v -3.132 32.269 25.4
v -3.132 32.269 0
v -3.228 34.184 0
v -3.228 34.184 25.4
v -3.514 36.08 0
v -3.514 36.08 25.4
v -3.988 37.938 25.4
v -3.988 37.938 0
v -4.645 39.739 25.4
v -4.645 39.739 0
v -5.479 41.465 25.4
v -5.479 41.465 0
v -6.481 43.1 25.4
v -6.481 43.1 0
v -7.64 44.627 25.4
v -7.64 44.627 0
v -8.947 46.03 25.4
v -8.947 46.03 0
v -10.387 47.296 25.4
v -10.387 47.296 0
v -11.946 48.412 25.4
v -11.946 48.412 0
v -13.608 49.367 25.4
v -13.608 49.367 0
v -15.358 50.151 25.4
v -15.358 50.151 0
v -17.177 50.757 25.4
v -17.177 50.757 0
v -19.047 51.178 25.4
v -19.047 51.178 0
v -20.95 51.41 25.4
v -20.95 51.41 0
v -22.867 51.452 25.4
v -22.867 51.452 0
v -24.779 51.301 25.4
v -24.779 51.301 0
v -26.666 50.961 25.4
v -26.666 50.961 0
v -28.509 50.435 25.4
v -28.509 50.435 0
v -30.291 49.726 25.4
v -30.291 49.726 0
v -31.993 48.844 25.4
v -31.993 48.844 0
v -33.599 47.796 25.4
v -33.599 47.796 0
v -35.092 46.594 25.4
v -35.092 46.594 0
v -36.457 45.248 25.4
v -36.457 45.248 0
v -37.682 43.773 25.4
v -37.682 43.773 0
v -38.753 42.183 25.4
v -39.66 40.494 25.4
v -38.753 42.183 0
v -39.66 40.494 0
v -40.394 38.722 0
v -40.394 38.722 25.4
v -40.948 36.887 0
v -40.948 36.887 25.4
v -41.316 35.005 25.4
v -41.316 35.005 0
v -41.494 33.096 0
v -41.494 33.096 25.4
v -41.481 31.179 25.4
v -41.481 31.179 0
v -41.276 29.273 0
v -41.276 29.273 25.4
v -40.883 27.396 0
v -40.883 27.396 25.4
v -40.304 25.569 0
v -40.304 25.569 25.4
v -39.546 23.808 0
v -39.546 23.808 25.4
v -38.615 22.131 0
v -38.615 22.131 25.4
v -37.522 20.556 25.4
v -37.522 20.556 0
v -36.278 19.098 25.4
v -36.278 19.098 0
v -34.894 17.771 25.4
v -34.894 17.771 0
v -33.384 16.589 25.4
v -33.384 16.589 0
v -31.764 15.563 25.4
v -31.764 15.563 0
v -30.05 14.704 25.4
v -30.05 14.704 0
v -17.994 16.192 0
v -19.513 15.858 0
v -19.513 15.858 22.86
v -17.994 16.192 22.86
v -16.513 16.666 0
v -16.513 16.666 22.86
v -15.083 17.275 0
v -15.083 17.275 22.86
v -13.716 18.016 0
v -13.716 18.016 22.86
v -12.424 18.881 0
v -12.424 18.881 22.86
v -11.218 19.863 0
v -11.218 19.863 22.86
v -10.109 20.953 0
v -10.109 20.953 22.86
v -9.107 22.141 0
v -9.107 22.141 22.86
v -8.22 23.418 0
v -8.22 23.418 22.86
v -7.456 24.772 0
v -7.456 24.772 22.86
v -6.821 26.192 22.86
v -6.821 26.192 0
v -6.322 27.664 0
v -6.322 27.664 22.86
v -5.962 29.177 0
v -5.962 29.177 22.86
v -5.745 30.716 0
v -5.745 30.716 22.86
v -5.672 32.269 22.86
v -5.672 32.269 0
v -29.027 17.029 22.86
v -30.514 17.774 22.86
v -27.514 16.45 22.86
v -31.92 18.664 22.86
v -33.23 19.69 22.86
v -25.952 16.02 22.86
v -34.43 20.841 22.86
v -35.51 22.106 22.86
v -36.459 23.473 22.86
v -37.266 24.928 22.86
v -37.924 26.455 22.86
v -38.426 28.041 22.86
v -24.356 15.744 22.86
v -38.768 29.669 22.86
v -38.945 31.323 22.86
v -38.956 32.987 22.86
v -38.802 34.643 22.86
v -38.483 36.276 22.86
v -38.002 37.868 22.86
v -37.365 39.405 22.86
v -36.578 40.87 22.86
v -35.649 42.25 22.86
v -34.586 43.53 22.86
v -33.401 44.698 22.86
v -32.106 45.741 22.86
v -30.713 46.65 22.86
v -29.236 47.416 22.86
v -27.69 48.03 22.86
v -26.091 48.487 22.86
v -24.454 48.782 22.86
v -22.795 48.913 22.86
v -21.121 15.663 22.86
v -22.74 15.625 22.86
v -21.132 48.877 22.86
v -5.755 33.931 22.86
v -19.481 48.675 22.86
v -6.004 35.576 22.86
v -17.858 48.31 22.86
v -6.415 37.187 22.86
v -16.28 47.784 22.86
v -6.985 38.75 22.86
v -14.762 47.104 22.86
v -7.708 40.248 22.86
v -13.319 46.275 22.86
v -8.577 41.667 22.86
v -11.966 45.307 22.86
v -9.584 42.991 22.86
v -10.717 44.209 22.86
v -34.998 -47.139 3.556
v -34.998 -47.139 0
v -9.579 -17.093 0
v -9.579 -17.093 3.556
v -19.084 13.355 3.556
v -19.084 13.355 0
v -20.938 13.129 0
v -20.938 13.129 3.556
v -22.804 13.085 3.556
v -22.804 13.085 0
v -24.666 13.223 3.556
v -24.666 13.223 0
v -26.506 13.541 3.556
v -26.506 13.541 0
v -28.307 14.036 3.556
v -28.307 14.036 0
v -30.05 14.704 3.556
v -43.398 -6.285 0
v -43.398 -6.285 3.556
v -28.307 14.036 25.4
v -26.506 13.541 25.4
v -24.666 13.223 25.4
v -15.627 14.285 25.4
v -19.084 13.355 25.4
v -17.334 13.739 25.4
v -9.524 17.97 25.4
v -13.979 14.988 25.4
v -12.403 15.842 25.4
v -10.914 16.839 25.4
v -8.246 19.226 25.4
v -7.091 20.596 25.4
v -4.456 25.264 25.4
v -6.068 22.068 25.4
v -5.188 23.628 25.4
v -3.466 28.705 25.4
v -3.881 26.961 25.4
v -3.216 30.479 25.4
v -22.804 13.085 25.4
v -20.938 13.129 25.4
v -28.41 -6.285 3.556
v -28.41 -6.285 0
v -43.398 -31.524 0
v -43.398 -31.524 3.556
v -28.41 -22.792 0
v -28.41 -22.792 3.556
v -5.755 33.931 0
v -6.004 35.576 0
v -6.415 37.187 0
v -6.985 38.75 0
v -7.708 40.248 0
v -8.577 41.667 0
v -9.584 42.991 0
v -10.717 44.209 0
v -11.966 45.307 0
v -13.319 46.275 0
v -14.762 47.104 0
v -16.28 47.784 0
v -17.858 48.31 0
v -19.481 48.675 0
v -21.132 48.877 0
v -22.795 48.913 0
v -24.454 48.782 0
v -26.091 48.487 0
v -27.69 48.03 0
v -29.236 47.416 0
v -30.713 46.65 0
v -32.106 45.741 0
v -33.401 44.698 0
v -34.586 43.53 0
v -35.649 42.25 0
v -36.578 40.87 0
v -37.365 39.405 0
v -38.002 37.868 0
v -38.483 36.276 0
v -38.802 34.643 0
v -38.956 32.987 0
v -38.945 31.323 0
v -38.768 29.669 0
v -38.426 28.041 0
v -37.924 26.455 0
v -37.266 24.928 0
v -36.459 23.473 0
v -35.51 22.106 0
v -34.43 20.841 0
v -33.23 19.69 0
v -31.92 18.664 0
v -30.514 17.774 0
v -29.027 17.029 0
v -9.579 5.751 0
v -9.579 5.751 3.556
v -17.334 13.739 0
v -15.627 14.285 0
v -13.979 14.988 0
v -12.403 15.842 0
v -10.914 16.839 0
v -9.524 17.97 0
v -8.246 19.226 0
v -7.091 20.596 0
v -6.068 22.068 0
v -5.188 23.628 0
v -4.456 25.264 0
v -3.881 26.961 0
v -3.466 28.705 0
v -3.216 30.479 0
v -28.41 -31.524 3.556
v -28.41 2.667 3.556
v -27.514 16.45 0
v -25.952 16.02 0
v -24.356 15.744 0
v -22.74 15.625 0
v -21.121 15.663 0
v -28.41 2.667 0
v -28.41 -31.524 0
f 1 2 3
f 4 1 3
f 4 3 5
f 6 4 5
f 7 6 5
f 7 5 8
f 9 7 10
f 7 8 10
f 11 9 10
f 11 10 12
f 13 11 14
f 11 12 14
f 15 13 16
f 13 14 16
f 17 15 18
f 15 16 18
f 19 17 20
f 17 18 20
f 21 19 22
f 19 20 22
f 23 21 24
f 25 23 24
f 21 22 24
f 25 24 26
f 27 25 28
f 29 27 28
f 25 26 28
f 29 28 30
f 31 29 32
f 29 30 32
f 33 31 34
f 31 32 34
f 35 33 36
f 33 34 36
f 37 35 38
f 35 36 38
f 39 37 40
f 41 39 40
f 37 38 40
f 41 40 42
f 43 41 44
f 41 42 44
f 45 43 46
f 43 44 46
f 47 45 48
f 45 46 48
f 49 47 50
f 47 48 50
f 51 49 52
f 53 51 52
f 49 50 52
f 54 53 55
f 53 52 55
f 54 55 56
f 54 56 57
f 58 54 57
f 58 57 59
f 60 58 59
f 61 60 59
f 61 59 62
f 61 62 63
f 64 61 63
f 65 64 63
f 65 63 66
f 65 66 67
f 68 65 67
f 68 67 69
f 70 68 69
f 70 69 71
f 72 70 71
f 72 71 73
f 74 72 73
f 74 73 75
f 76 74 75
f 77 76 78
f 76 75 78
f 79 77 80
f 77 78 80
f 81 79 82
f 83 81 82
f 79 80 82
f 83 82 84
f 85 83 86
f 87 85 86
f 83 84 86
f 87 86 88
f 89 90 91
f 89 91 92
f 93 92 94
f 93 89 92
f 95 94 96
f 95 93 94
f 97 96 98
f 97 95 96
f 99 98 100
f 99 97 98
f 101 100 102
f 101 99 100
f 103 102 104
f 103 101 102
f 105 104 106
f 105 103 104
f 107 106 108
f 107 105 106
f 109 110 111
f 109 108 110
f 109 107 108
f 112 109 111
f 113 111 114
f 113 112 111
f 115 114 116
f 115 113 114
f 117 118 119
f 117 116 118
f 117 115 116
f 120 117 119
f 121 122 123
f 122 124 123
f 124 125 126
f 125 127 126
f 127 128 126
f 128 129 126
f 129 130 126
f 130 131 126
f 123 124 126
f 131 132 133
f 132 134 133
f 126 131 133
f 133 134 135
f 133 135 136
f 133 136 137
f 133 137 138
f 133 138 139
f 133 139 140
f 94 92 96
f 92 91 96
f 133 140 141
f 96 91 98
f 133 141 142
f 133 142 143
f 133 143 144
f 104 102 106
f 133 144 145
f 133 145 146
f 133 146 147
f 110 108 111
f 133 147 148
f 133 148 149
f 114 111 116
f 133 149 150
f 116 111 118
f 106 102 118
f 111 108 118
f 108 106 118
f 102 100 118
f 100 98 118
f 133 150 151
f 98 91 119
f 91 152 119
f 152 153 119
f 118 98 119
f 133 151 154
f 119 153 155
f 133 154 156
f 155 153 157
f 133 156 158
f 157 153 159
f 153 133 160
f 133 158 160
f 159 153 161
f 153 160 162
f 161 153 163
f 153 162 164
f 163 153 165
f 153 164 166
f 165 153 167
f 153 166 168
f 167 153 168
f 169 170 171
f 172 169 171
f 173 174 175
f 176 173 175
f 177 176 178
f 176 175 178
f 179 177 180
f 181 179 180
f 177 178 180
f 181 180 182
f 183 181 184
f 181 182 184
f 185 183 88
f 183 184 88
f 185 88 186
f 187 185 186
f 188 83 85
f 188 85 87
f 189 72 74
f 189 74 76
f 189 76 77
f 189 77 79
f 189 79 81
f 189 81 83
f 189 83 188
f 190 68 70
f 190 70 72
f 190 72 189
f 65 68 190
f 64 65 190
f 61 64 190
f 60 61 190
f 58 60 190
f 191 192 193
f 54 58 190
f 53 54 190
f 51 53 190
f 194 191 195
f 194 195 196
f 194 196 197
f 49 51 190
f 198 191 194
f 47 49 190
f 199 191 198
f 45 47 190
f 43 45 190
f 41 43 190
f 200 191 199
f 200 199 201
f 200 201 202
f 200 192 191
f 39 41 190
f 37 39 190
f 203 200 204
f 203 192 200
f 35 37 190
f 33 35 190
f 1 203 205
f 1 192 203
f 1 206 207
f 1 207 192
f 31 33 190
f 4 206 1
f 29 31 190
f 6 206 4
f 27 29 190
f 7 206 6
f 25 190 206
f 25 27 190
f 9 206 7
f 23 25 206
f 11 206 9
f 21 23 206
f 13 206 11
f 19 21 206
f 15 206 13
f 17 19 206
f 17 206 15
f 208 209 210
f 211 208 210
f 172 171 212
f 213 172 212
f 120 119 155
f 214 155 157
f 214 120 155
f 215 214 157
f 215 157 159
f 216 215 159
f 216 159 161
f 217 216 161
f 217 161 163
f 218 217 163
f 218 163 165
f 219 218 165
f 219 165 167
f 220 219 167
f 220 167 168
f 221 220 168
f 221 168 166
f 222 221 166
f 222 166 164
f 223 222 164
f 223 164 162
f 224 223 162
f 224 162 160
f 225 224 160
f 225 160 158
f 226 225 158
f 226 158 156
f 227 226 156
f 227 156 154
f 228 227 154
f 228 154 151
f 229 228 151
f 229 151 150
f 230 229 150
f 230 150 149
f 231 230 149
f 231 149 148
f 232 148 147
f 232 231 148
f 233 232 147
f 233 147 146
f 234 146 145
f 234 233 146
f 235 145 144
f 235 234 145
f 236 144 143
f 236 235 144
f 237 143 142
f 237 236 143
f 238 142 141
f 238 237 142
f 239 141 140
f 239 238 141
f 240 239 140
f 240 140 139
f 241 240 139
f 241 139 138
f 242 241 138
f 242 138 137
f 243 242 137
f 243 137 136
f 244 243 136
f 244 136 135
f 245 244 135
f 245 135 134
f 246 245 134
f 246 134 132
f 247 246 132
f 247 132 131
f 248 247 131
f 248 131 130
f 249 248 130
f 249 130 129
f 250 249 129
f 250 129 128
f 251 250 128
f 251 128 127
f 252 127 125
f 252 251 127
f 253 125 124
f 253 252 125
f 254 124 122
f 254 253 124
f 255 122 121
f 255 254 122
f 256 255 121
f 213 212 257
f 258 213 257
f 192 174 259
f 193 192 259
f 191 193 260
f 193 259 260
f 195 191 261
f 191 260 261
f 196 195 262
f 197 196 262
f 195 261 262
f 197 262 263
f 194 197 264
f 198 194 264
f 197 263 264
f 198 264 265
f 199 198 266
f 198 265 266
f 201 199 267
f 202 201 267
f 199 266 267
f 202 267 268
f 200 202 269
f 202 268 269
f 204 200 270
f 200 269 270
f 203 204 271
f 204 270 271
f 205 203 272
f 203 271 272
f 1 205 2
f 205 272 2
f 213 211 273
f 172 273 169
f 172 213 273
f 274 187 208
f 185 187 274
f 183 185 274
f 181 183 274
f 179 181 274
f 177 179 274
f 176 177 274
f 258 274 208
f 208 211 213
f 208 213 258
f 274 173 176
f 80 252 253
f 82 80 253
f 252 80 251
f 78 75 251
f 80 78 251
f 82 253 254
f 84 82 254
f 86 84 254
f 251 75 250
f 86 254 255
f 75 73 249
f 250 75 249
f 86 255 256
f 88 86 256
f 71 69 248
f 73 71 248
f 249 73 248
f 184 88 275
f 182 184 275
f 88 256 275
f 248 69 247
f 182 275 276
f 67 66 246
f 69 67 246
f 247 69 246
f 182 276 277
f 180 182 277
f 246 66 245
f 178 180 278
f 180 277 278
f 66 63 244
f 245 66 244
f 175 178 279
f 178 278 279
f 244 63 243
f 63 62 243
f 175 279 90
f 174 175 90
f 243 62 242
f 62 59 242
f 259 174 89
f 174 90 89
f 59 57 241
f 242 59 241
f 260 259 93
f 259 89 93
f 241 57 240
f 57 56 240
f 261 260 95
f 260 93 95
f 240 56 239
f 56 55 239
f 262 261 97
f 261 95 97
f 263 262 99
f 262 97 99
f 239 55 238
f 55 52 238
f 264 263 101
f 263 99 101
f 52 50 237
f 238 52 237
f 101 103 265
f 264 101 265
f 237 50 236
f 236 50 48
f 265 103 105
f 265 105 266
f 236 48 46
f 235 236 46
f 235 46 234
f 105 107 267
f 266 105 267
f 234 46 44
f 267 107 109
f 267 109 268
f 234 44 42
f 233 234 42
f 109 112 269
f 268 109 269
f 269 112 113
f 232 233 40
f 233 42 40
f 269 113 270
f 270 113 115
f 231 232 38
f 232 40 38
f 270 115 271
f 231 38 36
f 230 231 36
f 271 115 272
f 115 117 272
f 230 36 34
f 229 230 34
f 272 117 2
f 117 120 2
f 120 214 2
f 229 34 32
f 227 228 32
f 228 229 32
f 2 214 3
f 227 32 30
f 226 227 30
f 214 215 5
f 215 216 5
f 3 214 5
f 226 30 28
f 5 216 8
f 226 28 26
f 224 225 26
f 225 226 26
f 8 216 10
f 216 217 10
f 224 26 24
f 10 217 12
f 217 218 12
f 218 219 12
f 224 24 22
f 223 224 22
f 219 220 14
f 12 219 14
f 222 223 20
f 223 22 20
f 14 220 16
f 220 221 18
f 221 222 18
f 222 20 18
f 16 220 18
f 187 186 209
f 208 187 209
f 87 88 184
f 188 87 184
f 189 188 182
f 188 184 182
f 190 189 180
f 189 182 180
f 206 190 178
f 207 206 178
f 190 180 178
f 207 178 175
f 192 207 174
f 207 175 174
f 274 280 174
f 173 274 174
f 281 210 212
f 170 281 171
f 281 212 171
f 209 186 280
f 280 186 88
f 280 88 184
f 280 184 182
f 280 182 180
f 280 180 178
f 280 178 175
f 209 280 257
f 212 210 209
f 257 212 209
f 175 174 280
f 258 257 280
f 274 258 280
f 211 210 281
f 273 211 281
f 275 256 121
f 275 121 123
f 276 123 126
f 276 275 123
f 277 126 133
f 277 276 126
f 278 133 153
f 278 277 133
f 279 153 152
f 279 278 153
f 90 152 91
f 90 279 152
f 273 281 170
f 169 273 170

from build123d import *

# Parameters (mm, degrees)
F1_DEPTH = 25.4
F2_DEPTH = 3.556
F3_T     = -2.54


with BuildPart() as f1:
    # F0 (on Top) → F1 (new body)
    with BuildSketch(Plane.XY):
        with BuildLine():
            ThreePointArc((-19.084094, 13.35455), (-7.652475, 19.897622), (-3.132037, 32.269336))
            ThreePointArc((-3.132037, 32.269336), (-32.808841, 48.340367), (-30.050137, 14.70437))
            ThreePointArc((-30.050137, 14.70437), (-24.666363, 13.223166), (-19.084094, 13.35455))
        make_face()
    extrude(amount=F1_DEPTH)

    # F3
    f3_openings = [f1.faces().sort_by_distance(p)[0] for p in [
        (-22.321953, 32.269336, 0),
    ]]
    offset(amount=F3_T, openings=f3_openings)


with BuildPart() as f2:
    # F0 (on Top) → F2 (new body)
    with BuildSketch(Plane.XY):
        with BuildLine():
            ThreePointArc((-19.084094, 13.35455), (-24.666363, 13.223166), (-30.050137, 14.70437))
            Line((-30.050137, 14.70437), (-43.398347, -6.2854))
            Line((-43.398347, -6.2854), (-28.409777, -6.2854))
            Line((-28.409777, -6.2854), (-43.398347, -31.524297))
            Line((-43.398347, -31.524297), (-28.409777, -31.524297))
            Line((-28.409777, -31.524297), (-34.997916, -47.138913))
            Line((-34.997916, -47.138913), (-9.578819, -17.092727))
            Line((-9.578819, -17.092727), (-28.409777, -22.791805))
            Line((-28.409777, -22.791805), (-9.578819, 5.751056))
            Line((-9.578819, 5.751056), (-28.409777, 2.666984))
            Line((-28.409777, 2.666984), (-19.084094, 13.35455))
        make_face()
    extrude(amount=F2_DEPTH)


solid = Compound([f1.part, f2.part])
